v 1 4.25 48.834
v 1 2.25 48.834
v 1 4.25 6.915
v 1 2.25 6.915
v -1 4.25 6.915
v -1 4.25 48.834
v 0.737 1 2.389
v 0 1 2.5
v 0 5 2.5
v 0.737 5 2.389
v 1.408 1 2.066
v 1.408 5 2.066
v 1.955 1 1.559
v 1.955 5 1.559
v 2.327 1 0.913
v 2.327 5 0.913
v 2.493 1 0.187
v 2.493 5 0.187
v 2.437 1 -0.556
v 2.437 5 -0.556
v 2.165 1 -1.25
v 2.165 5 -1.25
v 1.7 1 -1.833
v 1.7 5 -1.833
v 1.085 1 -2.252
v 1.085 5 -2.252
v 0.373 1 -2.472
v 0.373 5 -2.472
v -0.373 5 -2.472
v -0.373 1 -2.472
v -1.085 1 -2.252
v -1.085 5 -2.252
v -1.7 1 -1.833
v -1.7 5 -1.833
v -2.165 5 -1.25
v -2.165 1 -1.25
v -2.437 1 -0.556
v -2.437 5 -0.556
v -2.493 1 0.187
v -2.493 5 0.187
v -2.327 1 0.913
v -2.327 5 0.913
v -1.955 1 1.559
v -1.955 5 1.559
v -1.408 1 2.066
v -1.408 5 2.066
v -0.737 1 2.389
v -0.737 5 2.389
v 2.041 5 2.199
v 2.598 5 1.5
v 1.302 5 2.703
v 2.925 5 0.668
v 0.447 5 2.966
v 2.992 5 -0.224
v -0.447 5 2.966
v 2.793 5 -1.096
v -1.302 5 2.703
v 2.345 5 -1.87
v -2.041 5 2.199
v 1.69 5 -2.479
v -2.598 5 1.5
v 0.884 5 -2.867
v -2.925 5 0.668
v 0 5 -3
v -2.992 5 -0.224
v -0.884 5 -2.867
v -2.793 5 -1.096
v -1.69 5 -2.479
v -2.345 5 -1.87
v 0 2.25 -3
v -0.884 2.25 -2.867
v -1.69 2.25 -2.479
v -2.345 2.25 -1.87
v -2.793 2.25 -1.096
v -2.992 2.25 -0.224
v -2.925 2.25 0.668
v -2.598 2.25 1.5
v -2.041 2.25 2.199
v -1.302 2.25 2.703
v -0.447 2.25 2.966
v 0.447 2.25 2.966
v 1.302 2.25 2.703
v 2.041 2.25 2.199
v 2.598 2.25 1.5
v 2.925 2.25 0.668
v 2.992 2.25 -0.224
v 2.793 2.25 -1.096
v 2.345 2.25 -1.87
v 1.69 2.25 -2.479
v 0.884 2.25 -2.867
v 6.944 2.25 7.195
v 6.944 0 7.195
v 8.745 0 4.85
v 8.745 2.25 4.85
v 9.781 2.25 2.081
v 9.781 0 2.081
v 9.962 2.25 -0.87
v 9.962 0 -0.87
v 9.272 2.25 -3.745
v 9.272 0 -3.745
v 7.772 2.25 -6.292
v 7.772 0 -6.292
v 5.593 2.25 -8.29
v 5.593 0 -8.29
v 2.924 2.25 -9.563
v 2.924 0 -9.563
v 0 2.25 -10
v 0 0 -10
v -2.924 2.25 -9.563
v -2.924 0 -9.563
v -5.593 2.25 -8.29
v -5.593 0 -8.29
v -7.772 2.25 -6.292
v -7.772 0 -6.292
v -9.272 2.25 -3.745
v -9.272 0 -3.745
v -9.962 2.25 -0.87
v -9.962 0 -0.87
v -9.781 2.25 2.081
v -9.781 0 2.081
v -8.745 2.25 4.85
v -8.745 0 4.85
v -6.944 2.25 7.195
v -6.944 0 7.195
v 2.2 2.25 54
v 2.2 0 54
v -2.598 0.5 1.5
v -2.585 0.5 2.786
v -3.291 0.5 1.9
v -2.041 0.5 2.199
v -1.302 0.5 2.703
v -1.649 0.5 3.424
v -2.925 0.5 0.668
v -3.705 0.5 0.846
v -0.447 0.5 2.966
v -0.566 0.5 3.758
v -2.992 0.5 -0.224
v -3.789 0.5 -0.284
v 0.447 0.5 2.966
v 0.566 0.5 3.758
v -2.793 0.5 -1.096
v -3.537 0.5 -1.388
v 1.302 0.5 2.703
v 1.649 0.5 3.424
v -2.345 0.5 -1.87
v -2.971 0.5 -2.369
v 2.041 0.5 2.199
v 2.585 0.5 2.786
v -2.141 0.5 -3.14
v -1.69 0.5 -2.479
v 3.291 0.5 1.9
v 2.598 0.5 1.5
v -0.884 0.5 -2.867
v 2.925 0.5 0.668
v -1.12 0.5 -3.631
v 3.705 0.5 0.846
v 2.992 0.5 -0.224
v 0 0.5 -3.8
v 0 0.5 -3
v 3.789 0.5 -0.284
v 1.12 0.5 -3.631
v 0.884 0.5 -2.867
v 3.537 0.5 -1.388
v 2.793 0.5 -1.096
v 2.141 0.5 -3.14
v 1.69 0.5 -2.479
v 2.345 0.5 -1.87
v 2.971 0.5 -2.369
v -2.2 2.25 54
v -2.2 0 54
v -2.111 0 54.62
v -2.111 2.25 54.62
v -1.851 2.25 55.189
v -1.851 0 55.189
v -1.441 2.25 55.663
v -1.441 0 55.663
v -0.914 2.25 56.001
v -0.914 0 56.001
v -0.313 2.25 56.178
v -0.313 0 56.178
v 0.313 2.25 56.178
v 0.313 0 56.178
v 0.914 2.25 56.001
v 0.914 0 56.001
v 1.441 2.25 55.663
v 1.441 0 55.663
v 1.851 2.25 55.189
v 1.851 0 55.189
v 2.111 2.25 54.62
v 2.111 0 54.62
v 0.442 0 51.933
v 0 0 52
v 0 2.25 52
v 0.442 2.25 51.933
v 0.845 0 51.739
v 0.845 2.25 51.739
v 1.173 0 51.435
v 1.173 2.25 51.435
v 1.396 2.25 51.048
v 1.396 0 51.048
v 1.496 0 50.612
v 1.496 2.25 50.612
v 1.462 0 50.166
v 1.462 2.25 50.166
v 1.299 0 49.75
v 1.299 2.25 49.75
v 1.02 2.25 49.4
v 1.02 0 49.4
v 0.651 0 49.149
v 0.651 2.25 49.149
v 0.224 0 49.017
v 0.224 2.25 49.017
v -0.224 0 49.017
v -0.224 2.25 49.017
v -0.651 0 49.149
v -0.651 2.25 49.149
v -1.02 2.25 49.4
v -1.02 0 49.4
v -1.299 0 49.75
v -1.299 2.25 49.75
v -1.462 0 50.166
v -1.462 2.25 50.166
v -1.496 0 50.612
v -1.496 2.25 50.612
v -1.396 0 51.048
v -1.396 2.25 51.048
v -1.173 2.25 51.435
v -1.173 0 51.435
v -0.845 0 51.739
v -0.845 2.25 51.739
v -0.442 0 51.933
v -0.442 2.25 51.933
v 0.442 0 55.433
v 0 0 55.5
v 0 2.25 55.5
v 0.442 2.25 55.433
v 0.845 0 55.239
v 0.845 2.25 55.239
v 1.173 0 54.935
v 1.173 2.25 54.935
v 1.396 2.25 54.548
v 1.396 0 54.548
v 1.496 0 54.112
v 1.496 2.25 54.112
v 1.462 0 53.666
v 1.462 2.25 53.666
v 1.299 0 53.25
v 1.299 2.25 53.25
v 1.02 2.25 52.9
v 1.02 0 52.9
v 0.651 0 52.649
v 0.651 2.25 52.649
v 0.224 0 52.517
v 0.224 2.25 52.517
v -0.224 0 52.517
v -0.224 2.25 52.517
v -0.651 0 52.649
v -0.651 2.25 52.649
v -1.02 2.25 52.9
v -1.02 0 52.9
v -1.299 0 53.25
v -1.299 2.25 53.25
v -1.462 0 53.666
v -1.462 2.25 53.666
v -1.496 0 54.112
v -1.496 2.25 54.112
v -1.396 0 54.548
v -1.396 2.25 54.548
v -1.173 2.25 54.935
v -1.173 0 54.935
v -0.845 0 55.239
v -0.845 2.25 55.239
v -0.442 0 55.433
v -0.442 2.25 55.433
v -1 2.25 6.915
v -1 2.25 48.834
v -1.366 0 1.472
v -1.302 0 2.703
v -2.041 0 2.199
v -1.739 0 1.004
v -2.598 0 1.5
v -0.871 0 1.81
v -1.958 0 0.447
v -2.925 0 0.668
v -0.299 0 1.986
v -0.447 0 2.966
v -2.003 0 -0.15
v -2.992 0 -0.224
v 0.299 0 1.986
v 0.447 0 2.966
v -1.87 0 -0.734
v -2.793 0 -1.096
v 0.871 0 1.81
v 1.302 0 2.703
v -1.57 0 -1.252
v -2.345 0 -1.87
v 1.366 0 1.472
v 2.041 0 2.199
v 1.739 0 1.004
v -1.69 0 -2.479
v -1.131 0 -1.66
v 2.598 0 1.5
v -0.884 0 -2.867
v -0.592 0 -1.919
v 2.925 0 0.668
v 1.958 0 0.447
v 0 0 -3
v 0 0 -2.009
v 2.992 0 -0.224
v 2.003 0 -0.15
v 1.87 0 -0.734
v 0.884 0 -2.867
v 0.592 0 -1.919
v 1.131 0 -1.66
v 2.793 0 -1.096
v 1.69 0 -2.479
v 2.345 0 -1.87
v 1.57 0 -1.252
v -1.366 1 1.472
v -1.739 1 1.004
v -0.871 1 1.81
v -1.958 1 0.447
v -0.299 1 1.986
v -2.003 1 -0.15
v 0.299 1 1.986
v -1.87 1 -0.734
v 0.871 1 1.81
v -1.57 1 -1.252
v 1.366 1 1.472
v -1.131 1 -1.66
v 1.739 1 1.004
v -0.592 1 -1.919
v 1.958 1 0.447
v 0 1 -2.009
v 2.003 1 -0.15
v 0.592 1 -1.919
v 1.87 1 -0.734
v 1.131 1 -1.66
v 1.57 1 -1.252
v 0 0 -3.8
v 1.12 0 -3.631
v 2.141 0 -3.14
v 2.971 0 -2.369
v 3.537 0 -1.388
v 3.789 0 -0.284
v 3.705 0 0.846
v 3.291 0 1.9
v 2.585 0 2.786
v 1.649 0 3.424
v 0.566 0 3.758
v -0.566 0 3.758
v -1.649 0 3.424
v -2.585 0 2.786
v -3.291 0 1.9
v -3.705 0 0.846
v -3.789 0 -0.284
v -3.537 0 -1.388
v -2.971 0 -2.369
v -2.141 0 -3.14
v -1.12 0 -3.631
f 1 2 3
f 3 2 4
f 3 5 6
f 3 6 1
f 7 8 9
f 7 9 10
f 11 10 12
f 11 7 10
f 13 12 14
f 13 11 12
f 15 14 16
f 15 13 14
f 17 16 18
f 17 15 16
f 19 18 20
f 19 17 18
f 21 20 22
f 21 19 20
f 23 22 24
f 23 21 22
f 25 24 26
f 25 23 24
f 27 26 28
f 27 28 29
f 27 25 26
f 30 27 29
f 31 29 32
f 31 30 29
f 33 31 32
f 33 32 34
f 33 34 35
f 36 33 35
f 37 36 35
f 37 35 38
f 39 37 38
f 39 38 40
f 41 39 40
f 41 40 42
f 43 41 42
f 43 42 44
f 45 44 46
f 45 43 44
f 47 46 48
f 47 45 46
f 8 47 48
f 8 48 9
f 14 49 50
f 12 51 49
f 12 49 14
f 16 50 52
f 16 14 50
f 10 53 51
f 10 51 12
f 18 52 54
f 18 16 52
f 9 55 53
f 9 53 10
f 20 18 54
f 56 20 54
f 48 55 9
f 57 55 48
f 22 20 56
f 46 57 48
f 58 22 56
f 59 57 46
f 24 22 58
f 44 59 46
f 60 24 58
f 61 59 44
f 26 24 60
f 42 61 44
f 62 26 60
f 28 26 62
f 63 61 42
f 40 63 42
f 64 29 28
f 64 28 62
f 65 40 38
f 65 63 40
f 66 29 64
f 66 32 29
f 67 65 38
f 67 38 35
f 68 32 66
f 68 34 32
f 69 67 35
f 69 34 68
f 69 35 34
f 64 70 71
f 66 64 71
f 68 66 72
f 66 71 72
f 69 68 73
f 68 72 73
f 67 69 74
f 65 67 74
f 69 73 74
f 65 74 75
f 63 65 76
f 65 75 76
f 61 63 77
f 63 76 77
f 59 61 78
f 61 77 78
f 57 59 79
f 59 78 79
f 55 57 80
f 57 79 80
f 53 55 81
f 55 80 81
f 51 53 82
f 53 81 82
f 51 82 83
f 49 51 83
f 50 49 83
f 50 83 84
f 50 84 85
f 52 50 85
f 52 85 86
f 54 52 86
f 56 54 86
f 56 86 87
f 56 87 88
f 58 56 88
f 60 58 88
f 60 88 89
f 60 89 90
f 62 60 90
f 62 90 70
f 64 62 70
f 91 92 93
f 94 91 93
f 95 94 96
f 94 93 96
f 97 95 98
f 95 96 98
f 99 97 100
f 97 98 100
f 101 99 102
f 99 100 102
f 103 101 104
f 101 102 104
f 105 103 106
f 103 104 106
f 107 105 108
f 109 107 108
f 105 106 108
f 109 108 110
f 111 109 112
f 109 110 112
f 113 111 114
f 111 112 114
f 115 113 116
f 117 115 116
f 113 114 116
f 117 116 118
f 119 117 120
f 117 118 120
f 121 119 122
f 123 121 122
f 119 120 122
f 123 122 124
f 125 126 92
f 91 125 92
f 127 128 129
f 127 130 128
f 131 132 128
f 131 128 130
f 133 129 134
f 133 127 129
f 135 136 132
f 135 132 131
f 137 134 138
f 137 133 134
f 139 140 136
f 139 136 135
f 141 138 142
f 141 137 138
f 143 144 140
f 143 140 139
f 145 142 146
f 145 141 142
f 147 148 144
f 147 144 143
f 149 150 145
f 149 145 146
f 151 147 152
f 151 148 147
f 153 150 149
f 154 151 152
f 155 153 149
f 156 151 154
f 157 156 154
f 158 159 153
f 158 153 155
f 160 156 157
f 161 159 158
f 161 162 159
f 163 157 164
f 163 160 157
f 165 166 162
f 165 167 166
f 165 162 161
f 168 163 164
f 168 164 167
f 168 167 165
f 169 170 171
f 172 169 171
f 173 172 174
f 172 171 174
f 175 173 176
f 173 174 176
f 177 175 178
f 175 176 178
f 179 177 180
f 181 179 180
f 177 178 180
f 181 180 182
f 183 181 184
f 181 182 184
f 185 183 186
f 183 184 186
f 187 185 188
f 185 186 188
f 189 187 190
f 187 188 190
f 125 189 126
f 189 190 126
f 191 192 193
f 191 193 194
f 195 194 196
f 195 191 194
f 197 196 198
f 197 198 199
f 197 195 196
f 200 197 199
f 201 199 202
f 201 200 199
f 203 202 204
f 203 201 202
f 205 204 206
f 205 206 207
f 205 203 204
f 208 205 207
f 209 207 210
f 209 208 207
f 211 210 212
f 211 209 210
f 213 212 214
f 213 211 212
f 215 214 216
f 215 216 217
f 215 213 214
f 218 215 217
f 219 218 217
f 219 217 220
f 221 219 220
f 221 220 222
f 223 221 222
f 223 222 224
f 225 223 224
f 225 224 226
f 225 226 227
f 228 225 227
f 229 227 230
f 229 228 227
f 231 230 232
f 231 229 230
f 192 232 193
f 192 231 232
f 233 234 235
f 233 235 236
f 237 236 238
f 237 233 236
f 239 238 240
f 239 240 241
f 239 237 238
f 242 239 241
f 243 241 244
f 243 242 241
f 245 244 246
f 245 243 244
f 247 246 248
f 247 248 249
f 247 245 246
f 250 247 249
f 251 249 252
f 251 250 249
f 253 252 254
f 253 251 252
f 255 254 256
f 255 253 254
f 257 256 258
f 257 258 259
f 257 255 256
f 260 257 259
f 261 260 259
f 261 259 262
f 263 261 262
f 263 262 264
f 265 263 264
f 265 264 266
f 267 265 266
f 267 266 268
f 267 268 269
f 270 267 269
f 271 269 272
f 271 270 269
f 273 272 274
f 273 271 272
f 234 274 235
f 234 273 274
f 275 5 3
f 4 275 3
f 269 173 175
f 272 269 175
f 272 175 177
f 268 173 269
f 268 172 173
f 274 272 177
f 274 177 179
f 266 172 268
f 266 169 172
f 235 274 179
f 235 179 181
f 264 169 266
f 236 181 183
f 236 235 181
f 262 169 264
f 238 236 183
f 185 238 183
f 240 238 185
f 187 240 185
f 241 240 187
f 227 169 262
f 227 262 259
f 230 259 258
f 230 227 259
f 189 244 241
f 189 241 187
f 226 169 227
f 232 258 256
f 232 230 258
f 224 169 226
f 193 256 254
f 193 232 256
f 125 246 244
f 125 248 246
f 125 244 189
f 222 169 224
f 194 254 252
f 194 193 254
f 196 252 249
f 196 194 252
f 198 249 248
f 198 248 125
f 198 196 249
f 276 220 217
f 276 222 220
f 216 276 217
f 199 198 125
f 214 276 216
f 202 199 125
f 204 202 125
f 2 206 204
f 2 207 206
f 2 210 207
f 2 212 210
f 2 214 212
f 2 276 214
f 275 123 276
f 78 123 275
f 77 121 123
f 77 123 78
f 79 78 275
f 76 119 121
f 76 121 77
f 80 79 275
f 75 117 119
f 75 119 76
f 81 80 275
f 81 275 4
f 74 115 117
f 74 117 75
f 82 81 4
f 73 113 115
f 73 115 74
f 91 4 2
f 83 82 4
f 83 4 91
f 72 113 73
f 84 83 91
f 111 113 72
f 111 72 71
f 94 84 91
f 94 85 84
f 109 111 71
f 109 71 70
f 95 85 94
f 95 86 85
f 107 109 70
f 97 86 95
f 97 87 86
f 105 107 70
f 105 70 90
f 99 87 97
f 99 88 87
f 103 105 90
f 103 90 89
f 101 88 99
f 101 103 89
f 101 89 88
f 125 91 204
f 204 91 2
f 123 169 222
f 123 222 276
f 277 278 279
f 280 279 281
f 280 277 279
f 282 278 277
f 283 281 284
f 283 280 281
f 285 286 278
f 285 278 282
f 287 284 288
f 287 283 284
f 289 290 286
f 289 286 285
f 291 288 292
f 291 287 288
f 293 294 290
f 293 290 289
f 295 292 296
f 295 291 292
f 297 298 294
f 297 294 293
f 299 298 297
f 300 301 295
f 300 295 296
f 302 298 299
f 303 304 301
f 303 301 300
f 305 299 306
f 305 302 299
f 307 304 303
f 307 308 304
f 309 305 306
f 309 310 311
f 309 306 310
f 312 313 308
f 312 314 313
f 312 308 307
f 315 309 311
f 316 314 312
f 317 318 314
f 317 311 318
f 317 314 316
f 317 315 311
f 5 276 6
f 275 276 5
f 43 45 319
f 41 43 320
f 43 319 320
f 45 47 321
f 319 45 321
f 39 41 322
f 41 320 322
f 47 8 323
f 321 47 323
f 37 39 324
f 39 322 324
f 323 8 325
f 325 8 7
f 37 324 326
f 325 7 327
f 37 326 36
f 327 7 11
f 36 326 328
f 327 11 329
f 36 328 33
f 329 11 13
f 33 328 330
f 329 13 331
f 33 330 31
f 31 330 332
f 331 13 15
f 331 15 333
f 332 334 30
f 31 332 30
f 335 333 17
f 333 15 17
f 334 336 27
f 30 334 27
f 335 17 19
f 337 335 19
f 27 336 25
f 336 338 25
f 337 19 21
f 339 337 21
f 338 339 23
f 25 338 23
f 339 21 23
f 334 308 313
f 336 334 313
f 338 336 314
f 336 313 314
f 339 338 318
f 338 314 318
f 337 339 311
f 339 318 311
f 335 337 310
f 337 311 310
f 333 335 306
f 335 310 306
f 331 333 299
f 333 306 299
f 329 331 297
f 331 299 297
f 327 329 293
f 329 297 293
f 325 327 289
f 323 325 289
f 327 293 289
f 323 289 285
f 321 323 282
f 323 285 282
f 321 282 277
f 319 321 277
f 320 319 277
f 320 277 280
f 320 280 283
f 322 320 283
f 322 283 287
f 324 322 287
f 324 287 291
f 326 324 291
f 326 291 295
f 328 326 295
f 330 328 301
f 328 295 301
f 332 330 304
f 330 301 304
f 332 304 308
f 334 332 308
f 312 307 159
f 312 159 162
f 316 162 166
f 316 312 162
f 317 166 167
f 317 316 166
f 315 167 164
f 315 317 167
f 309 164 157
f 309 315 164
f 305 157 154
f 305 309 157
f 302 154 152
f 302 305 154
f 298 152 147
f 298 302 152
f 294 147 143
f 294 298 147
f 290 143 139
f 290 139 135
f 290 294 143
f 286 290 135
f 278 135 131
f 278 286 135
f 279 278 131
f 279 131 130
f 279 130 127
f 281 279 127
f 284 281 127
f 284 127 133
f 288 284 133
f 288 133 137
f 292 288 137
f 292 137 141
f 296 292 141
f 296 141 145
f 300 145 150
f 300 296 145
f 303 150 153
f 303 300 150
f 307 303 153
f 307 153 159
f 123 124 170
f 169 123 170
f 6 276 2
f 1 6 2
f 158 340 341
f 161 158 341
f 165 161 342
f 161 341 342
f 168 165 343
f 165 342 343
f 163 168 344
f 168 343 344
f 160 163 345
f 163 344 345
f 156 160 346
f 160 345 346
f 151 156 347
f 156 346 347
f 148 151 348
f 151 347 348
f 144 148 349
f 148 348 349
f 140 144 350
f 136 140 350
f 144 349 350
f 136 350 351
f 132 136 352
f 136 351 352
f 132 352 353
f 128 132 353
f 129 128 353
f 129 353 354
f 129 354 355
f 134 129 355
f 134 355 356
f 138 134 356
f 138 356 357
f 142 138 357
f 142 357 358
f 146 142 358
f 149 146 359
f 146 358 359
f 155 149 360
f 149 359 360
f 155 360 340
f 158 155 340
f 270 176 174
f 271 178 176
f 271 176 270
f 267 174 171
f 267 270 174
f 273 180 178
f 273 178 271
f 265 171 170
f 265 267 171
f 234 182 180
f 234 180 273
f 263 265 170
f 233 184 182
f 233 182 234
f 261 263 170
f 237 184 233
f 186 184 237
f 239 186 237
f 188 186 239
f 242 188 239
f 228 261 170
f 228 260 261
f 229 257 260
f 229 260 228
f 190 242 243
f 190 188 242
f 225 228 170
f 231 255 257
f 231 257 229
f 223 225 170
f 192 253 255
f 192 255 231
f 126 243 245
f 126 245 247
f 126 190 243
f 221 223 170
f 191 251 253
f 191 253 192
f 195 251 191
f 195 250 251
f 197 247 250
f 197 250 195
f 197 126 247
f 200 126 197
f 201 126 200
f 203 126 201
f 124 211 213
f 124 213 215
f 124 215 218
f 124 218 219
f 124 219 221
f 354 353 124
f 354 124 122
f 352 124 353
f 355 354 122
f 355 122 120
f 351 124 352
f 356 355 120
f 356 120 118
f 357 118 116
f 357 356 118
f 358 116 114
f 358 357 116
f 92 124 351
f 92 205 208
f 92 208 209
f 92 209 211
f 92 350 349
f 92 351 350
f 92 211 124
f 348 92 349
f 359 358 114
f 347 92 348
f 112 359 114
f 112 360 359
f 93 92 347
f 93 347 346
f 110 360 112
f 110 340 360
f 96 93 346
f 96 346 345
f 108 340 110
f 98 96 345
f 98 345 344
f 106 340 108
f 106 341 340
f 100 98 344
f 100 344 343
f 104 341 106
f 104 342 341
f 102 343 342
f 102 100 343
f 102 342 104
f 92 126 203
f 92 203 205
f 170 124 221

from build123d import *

# Parameters (mm, degrees)
SKETCH1_R           = 3
SKETCH1_R_2         = 1.5
BOSS_EXTRUDE1_DEPTH = 2.25
SKETCH2_R           = 3.879501895
BOSS_EXTRUDE2_DEPTH = 2.25
SKETCH3_R           = 3
SKETCH3_R_2         = 2.008527967
BOSS_EXTRUDE3_DEPTH = 1
SKETCH4_R           = 3.8
SKETCH4_R_2         = 3
CUT_EXTRUDE1_DEPTH  = 0.5
SKETCH5_W           = 2
SKETCH5_H           = 45.085962507
BOSS_EXTRUDE4_DEPTH = 2
CUT_EXTRUDE2_START  = -2.25
SKETCH7_R           = 3.879501895
CUT_EXTRUDE2_DEPTH  = 2.25
SKETCH8_R           = 3
SKETCH8_R_2         = 2.5
BOSS_EXTRUDE5_DEPTH = 4
SKETCH9_W           = 2
SKETCH9_H           = 3.166270057
CUT_EXTRUDE3_DEPTH  = 2


with BuildPart() as part:
    # Sketch1 → Boss-Extrude1 (new body)
    with BuildSketch(Plane(origin=(0, 0, 0), x_dir=(1, 0, 0), z_dir=(0, 1, 0))):
        with BuildLine():
            Line((2.2, -54), (6.944444444, -7.195463248))
            ThreePointArc((6.944444444, -7.195463248), (0, 10), (-6.944444444, -7.195463248))
            Line((-6.944444444, -7.195463248), (-2.2, -54))
            ThreePointArc((-2.2, -54), (0, -56.2), (2.2, -54))
        make_face()
        with Locations(Location((0, 0, 0), (0, 0, 270))):
            Circle(SKETCH1_R, mode=Mode.SUBTRACT)
        with Locations(Location((0, -54, 0), (0, 0, 270))):
            Circle(SKETCH1_R_2, mode=Mode.SUBTRACT)
        with Locations(Location((0, -50.5, 0), (0, 0, 270))):
            Circle(SKETCH1_R_2, mode=Mode.SUBTRACT)
    extrude(amount=BOSS_EXTRUDE1_DEPTH)

    # Sketch2 → Boss-Extrude2 (add)
    with BuildSketch(Plane(origin=(0, 2.25, 0), x_dir=(1, 0, 0), z_dir=(0, 1, 0))):
        with Locations(Location((0, 0, 0), (0, 0, 270))):
            Circle(SKETCH2_R)
        with BuildLine():
            Line((1.96, 0), (2.349274052, 0.224747479))
            ThreePointArc((2.349274052, 0.224747479), (2.341390695, 0.295786431), (2.331359713, 0.366554076))
            Line((2.331359713, 0.366554076), (1.898422996, 0.487432179))
            Line((1.898422996, 0.487432179), (2.219574862, 0.801927322))
            ThreePointArc((2.219574862, 0.801927322), (2.194272507, 0.868773944), (2.166957468, 0.934823689))
            Line((2.166957468, 0.934823689), (1.717561093, 0.944237201))
            Line((1.717561093, 0.944237201), (1.950411621, 1.328719123))
            ThreePointArc((1.950411621, 1.328719123), (1.909280107, 1.387173195), (1.866397317, 1.444354892))
            Line((1.866397317, 1.444354892), (1.42877851, 1.341712328))
            Line((1.42877851, 1.341712328), (1.558696845, 1.772022614))
            ThreePointArc((1.558696845, 1.772022614), (1.504320616, 1.818411253), (1.448564558, 1.863131966))
            Line((1.448564558, 1.863131966), (1.050220518, 1.654882734))
            Line((1.050220518, 1.654882734), (1.069043413, 2.103983408))
            ThreePointArc((1.069043413, 2.103983408), (1.004839128, 2.135391844), (0.939713161, 2.164841605))
            Line((0.939713161, 2.164841605), (0.605673309, 1.864070772))
            Line((0.605673309, 1.864070772), (0.512218052, 2.303743186))
            ThreePointArc((0.512218052, 2.303743186), (0.442219902, 2.318197912), (0.371816129, 2.330526285))
            Line((0.371816129, 2.330526285), (0.123069418, 1.956132388))
            Line((0.123069418, 1.956132388), (-0.076791853, 2.358750307))
            ThreePointArc((-0.076791853, 2.358750307), (-0.148185626, 2.355343079), (-0.219443477, 2.349775428))
            Line((-0.219443477, 2.349775428), (-0.367267377, 1.925283011))
            Line((-0.367267377, 1.925283011), (-0.660976643, 2.265548472))
            ThreePointArc((-0.660976643, 2.265548472), (-0.729280107, 2.244493378), (-0.796914643, 2.221379538))
            Line((-0.796914643, 2.221379538), (-0.834527411, 1.773461023))
            Line((-0.834527411, 1.773461023), (-1.20362984, 2.029993894))
            ThreePointArc((-1.20362984, 2.029993894), (-1.264551236, 1.992613904), (-1.324312731, 1.953406202))
            Line((-1.324312731, 1.953406202), (-1.24935102, 1.510205956))
            Line((-1.24935102, 1.510205956), (-1.670654548, 1.666887333))
            ThreePointArc((-1.670654548, 1.666887333), (-1.720365961, 1.61553117), (-1.768499379, 1.562693171))
            Line((-1.768499379, 1.562693171), (-1.585673309, 1.152059094))
            Line((-1.585673309, 1.152059094), (-2.032705886, 1.199044112))
            ThreePointArc((-2.032705886, 1.199044112), (-2.068083765, 1.136938671), (-2.101564707, 1.07379038))
            Line((-2.101564707, 1.07379038), (-1.822361912, 0.721524123))
            Line((-1.822361912, 0.721524123), (-2.267034837, 0.655860539))
            ThreePointArc((-2.267034837, 0.655860539), (-2.28585626, 0.586908134), (-2.302580996, 0.517417391))
            Line((-2.302580996, 0.517417391), (-1.944544815, 0.245653138))
            Line((-1.944544815, 0.245653138), (-2.358917653, 0.071466836))
            ThreePointArc((-2.358917653, 0.071466836), (-2.36, 0), (-2.358917653, -0.071466836))
            Line((-2.358917653, -0.071466836), (-1.944544815, -0.245653138))
            Line((-1.944544815, -0.245653138), (-2.302580996, -0.517417391))
            ThreePointArc((-2.302580996, -0.517417391), (-2.28585626, -0.586908134), (-2.267034837, -0.655860539))
            Line((-2.267034837, -0.655860539), (-1.822361912, -0.721524123))
            Line((-1.822361912, -0.721524123), (-2.101564707, -1.07379038))
            ThreePointArc((-2.101564707, -1.07379038), (-2.068083765, -1.136938671), (-2.032705886, -1.199044112))
            Line((-2.032705886, -1.199044112), (-1.585673309, -1.152059094))
            Line((-1.585673309, -1.152059094), (-1.768499379, -1.562693171))
            ThreePointArc((-1.768499379, -1.562693171), (-1.720365961, -1.61553117), (-1.670654548, -1.666887333))
            Line((-1.670654548, -1.666887333), (-1.24935102, -1.510205956))
            Line((-1.24935102, -1.510205956), (-1.324312731, -1.953406202))
            ThreePointArc((-1.324312731, -1.953406202), (-1.264551236, -1.992613904), (-1.20362984, -2.029993894))
            Line((-1.20362984, -2.029993894), (-0.834527411, -1.773461023))
            Line((-0.834527411, -1.773461023), (-0.796914643, -2.221379538))
            ThreePointArc((-0.796914643, -2.221379538), (-0.729280107, -2.244493378), (-0.660976643, -2.265548472))
            Line((-0.660976643, -2.265548472), (-0.367267377, -1.925283011))
            Line((-0.367267377, -1.925283011), (-0.219443477, -2.349775428))
            ThreePointArc((-0.219443477, -2.349775428), (-0.148185626, -2.355343079), (-0.076791853, -2.358750307))
            Line((-0.076791853, -2.358750307), (0.123069418, -1.956132388))
            Line((0.123069418, -1.956132388), (0.371816129, -2.330526285))
            ThreePointArc((0.371816129, -2.330526285), (0.442219902, -2.318197912), (0.512218052, -2.303743186))
            Line((0.512218052, -2.303743186), (0.605673309, -1.864070772))
            Line((0.605673309, -1.864070772), (0.939713161, -2.164841605))
            ThreePointArc((0.939713161, -2.164841605), (1.004839128, -2.135391844), (1.069043413, -2.103983408))
            Line((1.069043413, -2.103983408), (1.050220518, -1.654882734))
            Line((1.050220518, -1.654882734), (1.448564558, -1.863131966))
            ThreePointArc((1.448564558, -1.863131966), (1.504320616, -1.818411253), (1.558696845, -1.772022614))
            Line((1.558696845, -1.772022614), (1.42877851, -1.341712328))
            Line((1.42877851, -1.341712328), (1.866397317, -1.444354892))
            ThreePointArc((1.866397317, -1.444354892), (1.909280107, -1.387173195), (1.950411621, -1.328719123))
            Line((1.950411621, -1.328719123), (1.717561093, -0.944237201))
            Line((1.717561093, -0.944237201), (2.166957468, -0.934823689))
            ThreePointArc((2.166957468, -0.934823689), (2.194272507, -0.868773944), (2.219574862, -0.801927322))
            Line((2.219574862, -0.801927322), (1.898422996, -0.487432179))
            Line((1.898422996, -0.487432179), (2.331359713, -0.366554076))
            ThreePointArc((2.331359713, -0.366554076), (2.341390695, -0.295786431), (2.349274052, -0.224747479))
            Line((2.349274052, -0.224747479), (1.96, 0))
        make_face(mode=Mode.SUBTRACT)
    extrude(amount=BOSS_EXTRUDE2_DEPTH)

    # Sketch3 → Boss-Extrude3 (add)
    with BuildSketch(Plane.XZ):
        with Locations(Location((0, 0, 0), (0, 0, 270))):
            Circle(SKETCH3_R)
        with Locations(Location((0, 0, 0), (0, 0, 270))):
            Circle(SKETCH3_R_2, mode=Mode.SUBTRACT)
    extrude(amount=-BOSS_EXTRUDE3_DEPTH)

    # Sketch4 → Cut-Extrude1 (cut)
    with BuildSketch(Plane.XZ):
        with Locations(Location((0, 0, 0), (0, 0, 270))):
            Circle(SKETCH4_R)
        with Locations(Location((0, 0, 0), (0, 0, 270))):
            Circle(SKETCH4_R_2, mode=Mode.SUBTRACT)
    extrude(amount=-CUT_EXTRUDE1_DEPTH, mode=Mode.SUBTRACT)

    # Sketch5 → Boss-Extrude4 (add)
    with BuildSketch(Plane(origin=(0, 2.25, 0), x_dir=(1, 0, 0), z_dir=(0, 1, 0))):
        with Locations((0, -26.291385575)):
            Rectangle(SKETCH5_W, SKETCH5_H)
    extrude(amount=BOSS_EXTRUDE4_DEPTH)

    # Sketch7 → Cut-Extrude2 (cut)
    with BuildSketch(Plane(origin=(0, 4.5, 0), x_dir=(1, 0, 0), z_dir=(0, 1, 0)).offset(CUT_EXTRUDE2_START)):
        Circle(SKETCH7_R)
    extrude(amount=CUT_EXTRUDE2_DEPTH, mode=Mode.SUBTRACT)

    # Sketch8 → Boss-Extrude5 (add)
    with BuildSketch(Plane(origin=(0, 1, 0), x_dir=(1, 0, 0), z_dir=(0, 1, 0))):
        with Locations(Location((0, 0, 0), (0, 0, 90))):
            Circle(SKETCH8_R)
        with Locations(Location((0, 0, 0), (0, 0, 270))):
            Circle(SKETCH8_R_2, mode=Mode.SUBTRACT)
    extrude(amount=BOSS_EXTRUDE5_DEPTH)

    # Sketch9 → Cut-Extrude3 (cut)
    with BuildSketch(Plane(origin=(0, 4.25, 0), x_dir=(1, 0, 0), z_dir=(0, 1, 0))):
        with Locations((0, -5.33153935)):
            Rectangle(SKETCH9_W, SKETCH9_H)
    extrude(amount=-CUT_EXTRUDE3_DEPTH, mode=Mode.SUBTRACT)


solid = part.part
